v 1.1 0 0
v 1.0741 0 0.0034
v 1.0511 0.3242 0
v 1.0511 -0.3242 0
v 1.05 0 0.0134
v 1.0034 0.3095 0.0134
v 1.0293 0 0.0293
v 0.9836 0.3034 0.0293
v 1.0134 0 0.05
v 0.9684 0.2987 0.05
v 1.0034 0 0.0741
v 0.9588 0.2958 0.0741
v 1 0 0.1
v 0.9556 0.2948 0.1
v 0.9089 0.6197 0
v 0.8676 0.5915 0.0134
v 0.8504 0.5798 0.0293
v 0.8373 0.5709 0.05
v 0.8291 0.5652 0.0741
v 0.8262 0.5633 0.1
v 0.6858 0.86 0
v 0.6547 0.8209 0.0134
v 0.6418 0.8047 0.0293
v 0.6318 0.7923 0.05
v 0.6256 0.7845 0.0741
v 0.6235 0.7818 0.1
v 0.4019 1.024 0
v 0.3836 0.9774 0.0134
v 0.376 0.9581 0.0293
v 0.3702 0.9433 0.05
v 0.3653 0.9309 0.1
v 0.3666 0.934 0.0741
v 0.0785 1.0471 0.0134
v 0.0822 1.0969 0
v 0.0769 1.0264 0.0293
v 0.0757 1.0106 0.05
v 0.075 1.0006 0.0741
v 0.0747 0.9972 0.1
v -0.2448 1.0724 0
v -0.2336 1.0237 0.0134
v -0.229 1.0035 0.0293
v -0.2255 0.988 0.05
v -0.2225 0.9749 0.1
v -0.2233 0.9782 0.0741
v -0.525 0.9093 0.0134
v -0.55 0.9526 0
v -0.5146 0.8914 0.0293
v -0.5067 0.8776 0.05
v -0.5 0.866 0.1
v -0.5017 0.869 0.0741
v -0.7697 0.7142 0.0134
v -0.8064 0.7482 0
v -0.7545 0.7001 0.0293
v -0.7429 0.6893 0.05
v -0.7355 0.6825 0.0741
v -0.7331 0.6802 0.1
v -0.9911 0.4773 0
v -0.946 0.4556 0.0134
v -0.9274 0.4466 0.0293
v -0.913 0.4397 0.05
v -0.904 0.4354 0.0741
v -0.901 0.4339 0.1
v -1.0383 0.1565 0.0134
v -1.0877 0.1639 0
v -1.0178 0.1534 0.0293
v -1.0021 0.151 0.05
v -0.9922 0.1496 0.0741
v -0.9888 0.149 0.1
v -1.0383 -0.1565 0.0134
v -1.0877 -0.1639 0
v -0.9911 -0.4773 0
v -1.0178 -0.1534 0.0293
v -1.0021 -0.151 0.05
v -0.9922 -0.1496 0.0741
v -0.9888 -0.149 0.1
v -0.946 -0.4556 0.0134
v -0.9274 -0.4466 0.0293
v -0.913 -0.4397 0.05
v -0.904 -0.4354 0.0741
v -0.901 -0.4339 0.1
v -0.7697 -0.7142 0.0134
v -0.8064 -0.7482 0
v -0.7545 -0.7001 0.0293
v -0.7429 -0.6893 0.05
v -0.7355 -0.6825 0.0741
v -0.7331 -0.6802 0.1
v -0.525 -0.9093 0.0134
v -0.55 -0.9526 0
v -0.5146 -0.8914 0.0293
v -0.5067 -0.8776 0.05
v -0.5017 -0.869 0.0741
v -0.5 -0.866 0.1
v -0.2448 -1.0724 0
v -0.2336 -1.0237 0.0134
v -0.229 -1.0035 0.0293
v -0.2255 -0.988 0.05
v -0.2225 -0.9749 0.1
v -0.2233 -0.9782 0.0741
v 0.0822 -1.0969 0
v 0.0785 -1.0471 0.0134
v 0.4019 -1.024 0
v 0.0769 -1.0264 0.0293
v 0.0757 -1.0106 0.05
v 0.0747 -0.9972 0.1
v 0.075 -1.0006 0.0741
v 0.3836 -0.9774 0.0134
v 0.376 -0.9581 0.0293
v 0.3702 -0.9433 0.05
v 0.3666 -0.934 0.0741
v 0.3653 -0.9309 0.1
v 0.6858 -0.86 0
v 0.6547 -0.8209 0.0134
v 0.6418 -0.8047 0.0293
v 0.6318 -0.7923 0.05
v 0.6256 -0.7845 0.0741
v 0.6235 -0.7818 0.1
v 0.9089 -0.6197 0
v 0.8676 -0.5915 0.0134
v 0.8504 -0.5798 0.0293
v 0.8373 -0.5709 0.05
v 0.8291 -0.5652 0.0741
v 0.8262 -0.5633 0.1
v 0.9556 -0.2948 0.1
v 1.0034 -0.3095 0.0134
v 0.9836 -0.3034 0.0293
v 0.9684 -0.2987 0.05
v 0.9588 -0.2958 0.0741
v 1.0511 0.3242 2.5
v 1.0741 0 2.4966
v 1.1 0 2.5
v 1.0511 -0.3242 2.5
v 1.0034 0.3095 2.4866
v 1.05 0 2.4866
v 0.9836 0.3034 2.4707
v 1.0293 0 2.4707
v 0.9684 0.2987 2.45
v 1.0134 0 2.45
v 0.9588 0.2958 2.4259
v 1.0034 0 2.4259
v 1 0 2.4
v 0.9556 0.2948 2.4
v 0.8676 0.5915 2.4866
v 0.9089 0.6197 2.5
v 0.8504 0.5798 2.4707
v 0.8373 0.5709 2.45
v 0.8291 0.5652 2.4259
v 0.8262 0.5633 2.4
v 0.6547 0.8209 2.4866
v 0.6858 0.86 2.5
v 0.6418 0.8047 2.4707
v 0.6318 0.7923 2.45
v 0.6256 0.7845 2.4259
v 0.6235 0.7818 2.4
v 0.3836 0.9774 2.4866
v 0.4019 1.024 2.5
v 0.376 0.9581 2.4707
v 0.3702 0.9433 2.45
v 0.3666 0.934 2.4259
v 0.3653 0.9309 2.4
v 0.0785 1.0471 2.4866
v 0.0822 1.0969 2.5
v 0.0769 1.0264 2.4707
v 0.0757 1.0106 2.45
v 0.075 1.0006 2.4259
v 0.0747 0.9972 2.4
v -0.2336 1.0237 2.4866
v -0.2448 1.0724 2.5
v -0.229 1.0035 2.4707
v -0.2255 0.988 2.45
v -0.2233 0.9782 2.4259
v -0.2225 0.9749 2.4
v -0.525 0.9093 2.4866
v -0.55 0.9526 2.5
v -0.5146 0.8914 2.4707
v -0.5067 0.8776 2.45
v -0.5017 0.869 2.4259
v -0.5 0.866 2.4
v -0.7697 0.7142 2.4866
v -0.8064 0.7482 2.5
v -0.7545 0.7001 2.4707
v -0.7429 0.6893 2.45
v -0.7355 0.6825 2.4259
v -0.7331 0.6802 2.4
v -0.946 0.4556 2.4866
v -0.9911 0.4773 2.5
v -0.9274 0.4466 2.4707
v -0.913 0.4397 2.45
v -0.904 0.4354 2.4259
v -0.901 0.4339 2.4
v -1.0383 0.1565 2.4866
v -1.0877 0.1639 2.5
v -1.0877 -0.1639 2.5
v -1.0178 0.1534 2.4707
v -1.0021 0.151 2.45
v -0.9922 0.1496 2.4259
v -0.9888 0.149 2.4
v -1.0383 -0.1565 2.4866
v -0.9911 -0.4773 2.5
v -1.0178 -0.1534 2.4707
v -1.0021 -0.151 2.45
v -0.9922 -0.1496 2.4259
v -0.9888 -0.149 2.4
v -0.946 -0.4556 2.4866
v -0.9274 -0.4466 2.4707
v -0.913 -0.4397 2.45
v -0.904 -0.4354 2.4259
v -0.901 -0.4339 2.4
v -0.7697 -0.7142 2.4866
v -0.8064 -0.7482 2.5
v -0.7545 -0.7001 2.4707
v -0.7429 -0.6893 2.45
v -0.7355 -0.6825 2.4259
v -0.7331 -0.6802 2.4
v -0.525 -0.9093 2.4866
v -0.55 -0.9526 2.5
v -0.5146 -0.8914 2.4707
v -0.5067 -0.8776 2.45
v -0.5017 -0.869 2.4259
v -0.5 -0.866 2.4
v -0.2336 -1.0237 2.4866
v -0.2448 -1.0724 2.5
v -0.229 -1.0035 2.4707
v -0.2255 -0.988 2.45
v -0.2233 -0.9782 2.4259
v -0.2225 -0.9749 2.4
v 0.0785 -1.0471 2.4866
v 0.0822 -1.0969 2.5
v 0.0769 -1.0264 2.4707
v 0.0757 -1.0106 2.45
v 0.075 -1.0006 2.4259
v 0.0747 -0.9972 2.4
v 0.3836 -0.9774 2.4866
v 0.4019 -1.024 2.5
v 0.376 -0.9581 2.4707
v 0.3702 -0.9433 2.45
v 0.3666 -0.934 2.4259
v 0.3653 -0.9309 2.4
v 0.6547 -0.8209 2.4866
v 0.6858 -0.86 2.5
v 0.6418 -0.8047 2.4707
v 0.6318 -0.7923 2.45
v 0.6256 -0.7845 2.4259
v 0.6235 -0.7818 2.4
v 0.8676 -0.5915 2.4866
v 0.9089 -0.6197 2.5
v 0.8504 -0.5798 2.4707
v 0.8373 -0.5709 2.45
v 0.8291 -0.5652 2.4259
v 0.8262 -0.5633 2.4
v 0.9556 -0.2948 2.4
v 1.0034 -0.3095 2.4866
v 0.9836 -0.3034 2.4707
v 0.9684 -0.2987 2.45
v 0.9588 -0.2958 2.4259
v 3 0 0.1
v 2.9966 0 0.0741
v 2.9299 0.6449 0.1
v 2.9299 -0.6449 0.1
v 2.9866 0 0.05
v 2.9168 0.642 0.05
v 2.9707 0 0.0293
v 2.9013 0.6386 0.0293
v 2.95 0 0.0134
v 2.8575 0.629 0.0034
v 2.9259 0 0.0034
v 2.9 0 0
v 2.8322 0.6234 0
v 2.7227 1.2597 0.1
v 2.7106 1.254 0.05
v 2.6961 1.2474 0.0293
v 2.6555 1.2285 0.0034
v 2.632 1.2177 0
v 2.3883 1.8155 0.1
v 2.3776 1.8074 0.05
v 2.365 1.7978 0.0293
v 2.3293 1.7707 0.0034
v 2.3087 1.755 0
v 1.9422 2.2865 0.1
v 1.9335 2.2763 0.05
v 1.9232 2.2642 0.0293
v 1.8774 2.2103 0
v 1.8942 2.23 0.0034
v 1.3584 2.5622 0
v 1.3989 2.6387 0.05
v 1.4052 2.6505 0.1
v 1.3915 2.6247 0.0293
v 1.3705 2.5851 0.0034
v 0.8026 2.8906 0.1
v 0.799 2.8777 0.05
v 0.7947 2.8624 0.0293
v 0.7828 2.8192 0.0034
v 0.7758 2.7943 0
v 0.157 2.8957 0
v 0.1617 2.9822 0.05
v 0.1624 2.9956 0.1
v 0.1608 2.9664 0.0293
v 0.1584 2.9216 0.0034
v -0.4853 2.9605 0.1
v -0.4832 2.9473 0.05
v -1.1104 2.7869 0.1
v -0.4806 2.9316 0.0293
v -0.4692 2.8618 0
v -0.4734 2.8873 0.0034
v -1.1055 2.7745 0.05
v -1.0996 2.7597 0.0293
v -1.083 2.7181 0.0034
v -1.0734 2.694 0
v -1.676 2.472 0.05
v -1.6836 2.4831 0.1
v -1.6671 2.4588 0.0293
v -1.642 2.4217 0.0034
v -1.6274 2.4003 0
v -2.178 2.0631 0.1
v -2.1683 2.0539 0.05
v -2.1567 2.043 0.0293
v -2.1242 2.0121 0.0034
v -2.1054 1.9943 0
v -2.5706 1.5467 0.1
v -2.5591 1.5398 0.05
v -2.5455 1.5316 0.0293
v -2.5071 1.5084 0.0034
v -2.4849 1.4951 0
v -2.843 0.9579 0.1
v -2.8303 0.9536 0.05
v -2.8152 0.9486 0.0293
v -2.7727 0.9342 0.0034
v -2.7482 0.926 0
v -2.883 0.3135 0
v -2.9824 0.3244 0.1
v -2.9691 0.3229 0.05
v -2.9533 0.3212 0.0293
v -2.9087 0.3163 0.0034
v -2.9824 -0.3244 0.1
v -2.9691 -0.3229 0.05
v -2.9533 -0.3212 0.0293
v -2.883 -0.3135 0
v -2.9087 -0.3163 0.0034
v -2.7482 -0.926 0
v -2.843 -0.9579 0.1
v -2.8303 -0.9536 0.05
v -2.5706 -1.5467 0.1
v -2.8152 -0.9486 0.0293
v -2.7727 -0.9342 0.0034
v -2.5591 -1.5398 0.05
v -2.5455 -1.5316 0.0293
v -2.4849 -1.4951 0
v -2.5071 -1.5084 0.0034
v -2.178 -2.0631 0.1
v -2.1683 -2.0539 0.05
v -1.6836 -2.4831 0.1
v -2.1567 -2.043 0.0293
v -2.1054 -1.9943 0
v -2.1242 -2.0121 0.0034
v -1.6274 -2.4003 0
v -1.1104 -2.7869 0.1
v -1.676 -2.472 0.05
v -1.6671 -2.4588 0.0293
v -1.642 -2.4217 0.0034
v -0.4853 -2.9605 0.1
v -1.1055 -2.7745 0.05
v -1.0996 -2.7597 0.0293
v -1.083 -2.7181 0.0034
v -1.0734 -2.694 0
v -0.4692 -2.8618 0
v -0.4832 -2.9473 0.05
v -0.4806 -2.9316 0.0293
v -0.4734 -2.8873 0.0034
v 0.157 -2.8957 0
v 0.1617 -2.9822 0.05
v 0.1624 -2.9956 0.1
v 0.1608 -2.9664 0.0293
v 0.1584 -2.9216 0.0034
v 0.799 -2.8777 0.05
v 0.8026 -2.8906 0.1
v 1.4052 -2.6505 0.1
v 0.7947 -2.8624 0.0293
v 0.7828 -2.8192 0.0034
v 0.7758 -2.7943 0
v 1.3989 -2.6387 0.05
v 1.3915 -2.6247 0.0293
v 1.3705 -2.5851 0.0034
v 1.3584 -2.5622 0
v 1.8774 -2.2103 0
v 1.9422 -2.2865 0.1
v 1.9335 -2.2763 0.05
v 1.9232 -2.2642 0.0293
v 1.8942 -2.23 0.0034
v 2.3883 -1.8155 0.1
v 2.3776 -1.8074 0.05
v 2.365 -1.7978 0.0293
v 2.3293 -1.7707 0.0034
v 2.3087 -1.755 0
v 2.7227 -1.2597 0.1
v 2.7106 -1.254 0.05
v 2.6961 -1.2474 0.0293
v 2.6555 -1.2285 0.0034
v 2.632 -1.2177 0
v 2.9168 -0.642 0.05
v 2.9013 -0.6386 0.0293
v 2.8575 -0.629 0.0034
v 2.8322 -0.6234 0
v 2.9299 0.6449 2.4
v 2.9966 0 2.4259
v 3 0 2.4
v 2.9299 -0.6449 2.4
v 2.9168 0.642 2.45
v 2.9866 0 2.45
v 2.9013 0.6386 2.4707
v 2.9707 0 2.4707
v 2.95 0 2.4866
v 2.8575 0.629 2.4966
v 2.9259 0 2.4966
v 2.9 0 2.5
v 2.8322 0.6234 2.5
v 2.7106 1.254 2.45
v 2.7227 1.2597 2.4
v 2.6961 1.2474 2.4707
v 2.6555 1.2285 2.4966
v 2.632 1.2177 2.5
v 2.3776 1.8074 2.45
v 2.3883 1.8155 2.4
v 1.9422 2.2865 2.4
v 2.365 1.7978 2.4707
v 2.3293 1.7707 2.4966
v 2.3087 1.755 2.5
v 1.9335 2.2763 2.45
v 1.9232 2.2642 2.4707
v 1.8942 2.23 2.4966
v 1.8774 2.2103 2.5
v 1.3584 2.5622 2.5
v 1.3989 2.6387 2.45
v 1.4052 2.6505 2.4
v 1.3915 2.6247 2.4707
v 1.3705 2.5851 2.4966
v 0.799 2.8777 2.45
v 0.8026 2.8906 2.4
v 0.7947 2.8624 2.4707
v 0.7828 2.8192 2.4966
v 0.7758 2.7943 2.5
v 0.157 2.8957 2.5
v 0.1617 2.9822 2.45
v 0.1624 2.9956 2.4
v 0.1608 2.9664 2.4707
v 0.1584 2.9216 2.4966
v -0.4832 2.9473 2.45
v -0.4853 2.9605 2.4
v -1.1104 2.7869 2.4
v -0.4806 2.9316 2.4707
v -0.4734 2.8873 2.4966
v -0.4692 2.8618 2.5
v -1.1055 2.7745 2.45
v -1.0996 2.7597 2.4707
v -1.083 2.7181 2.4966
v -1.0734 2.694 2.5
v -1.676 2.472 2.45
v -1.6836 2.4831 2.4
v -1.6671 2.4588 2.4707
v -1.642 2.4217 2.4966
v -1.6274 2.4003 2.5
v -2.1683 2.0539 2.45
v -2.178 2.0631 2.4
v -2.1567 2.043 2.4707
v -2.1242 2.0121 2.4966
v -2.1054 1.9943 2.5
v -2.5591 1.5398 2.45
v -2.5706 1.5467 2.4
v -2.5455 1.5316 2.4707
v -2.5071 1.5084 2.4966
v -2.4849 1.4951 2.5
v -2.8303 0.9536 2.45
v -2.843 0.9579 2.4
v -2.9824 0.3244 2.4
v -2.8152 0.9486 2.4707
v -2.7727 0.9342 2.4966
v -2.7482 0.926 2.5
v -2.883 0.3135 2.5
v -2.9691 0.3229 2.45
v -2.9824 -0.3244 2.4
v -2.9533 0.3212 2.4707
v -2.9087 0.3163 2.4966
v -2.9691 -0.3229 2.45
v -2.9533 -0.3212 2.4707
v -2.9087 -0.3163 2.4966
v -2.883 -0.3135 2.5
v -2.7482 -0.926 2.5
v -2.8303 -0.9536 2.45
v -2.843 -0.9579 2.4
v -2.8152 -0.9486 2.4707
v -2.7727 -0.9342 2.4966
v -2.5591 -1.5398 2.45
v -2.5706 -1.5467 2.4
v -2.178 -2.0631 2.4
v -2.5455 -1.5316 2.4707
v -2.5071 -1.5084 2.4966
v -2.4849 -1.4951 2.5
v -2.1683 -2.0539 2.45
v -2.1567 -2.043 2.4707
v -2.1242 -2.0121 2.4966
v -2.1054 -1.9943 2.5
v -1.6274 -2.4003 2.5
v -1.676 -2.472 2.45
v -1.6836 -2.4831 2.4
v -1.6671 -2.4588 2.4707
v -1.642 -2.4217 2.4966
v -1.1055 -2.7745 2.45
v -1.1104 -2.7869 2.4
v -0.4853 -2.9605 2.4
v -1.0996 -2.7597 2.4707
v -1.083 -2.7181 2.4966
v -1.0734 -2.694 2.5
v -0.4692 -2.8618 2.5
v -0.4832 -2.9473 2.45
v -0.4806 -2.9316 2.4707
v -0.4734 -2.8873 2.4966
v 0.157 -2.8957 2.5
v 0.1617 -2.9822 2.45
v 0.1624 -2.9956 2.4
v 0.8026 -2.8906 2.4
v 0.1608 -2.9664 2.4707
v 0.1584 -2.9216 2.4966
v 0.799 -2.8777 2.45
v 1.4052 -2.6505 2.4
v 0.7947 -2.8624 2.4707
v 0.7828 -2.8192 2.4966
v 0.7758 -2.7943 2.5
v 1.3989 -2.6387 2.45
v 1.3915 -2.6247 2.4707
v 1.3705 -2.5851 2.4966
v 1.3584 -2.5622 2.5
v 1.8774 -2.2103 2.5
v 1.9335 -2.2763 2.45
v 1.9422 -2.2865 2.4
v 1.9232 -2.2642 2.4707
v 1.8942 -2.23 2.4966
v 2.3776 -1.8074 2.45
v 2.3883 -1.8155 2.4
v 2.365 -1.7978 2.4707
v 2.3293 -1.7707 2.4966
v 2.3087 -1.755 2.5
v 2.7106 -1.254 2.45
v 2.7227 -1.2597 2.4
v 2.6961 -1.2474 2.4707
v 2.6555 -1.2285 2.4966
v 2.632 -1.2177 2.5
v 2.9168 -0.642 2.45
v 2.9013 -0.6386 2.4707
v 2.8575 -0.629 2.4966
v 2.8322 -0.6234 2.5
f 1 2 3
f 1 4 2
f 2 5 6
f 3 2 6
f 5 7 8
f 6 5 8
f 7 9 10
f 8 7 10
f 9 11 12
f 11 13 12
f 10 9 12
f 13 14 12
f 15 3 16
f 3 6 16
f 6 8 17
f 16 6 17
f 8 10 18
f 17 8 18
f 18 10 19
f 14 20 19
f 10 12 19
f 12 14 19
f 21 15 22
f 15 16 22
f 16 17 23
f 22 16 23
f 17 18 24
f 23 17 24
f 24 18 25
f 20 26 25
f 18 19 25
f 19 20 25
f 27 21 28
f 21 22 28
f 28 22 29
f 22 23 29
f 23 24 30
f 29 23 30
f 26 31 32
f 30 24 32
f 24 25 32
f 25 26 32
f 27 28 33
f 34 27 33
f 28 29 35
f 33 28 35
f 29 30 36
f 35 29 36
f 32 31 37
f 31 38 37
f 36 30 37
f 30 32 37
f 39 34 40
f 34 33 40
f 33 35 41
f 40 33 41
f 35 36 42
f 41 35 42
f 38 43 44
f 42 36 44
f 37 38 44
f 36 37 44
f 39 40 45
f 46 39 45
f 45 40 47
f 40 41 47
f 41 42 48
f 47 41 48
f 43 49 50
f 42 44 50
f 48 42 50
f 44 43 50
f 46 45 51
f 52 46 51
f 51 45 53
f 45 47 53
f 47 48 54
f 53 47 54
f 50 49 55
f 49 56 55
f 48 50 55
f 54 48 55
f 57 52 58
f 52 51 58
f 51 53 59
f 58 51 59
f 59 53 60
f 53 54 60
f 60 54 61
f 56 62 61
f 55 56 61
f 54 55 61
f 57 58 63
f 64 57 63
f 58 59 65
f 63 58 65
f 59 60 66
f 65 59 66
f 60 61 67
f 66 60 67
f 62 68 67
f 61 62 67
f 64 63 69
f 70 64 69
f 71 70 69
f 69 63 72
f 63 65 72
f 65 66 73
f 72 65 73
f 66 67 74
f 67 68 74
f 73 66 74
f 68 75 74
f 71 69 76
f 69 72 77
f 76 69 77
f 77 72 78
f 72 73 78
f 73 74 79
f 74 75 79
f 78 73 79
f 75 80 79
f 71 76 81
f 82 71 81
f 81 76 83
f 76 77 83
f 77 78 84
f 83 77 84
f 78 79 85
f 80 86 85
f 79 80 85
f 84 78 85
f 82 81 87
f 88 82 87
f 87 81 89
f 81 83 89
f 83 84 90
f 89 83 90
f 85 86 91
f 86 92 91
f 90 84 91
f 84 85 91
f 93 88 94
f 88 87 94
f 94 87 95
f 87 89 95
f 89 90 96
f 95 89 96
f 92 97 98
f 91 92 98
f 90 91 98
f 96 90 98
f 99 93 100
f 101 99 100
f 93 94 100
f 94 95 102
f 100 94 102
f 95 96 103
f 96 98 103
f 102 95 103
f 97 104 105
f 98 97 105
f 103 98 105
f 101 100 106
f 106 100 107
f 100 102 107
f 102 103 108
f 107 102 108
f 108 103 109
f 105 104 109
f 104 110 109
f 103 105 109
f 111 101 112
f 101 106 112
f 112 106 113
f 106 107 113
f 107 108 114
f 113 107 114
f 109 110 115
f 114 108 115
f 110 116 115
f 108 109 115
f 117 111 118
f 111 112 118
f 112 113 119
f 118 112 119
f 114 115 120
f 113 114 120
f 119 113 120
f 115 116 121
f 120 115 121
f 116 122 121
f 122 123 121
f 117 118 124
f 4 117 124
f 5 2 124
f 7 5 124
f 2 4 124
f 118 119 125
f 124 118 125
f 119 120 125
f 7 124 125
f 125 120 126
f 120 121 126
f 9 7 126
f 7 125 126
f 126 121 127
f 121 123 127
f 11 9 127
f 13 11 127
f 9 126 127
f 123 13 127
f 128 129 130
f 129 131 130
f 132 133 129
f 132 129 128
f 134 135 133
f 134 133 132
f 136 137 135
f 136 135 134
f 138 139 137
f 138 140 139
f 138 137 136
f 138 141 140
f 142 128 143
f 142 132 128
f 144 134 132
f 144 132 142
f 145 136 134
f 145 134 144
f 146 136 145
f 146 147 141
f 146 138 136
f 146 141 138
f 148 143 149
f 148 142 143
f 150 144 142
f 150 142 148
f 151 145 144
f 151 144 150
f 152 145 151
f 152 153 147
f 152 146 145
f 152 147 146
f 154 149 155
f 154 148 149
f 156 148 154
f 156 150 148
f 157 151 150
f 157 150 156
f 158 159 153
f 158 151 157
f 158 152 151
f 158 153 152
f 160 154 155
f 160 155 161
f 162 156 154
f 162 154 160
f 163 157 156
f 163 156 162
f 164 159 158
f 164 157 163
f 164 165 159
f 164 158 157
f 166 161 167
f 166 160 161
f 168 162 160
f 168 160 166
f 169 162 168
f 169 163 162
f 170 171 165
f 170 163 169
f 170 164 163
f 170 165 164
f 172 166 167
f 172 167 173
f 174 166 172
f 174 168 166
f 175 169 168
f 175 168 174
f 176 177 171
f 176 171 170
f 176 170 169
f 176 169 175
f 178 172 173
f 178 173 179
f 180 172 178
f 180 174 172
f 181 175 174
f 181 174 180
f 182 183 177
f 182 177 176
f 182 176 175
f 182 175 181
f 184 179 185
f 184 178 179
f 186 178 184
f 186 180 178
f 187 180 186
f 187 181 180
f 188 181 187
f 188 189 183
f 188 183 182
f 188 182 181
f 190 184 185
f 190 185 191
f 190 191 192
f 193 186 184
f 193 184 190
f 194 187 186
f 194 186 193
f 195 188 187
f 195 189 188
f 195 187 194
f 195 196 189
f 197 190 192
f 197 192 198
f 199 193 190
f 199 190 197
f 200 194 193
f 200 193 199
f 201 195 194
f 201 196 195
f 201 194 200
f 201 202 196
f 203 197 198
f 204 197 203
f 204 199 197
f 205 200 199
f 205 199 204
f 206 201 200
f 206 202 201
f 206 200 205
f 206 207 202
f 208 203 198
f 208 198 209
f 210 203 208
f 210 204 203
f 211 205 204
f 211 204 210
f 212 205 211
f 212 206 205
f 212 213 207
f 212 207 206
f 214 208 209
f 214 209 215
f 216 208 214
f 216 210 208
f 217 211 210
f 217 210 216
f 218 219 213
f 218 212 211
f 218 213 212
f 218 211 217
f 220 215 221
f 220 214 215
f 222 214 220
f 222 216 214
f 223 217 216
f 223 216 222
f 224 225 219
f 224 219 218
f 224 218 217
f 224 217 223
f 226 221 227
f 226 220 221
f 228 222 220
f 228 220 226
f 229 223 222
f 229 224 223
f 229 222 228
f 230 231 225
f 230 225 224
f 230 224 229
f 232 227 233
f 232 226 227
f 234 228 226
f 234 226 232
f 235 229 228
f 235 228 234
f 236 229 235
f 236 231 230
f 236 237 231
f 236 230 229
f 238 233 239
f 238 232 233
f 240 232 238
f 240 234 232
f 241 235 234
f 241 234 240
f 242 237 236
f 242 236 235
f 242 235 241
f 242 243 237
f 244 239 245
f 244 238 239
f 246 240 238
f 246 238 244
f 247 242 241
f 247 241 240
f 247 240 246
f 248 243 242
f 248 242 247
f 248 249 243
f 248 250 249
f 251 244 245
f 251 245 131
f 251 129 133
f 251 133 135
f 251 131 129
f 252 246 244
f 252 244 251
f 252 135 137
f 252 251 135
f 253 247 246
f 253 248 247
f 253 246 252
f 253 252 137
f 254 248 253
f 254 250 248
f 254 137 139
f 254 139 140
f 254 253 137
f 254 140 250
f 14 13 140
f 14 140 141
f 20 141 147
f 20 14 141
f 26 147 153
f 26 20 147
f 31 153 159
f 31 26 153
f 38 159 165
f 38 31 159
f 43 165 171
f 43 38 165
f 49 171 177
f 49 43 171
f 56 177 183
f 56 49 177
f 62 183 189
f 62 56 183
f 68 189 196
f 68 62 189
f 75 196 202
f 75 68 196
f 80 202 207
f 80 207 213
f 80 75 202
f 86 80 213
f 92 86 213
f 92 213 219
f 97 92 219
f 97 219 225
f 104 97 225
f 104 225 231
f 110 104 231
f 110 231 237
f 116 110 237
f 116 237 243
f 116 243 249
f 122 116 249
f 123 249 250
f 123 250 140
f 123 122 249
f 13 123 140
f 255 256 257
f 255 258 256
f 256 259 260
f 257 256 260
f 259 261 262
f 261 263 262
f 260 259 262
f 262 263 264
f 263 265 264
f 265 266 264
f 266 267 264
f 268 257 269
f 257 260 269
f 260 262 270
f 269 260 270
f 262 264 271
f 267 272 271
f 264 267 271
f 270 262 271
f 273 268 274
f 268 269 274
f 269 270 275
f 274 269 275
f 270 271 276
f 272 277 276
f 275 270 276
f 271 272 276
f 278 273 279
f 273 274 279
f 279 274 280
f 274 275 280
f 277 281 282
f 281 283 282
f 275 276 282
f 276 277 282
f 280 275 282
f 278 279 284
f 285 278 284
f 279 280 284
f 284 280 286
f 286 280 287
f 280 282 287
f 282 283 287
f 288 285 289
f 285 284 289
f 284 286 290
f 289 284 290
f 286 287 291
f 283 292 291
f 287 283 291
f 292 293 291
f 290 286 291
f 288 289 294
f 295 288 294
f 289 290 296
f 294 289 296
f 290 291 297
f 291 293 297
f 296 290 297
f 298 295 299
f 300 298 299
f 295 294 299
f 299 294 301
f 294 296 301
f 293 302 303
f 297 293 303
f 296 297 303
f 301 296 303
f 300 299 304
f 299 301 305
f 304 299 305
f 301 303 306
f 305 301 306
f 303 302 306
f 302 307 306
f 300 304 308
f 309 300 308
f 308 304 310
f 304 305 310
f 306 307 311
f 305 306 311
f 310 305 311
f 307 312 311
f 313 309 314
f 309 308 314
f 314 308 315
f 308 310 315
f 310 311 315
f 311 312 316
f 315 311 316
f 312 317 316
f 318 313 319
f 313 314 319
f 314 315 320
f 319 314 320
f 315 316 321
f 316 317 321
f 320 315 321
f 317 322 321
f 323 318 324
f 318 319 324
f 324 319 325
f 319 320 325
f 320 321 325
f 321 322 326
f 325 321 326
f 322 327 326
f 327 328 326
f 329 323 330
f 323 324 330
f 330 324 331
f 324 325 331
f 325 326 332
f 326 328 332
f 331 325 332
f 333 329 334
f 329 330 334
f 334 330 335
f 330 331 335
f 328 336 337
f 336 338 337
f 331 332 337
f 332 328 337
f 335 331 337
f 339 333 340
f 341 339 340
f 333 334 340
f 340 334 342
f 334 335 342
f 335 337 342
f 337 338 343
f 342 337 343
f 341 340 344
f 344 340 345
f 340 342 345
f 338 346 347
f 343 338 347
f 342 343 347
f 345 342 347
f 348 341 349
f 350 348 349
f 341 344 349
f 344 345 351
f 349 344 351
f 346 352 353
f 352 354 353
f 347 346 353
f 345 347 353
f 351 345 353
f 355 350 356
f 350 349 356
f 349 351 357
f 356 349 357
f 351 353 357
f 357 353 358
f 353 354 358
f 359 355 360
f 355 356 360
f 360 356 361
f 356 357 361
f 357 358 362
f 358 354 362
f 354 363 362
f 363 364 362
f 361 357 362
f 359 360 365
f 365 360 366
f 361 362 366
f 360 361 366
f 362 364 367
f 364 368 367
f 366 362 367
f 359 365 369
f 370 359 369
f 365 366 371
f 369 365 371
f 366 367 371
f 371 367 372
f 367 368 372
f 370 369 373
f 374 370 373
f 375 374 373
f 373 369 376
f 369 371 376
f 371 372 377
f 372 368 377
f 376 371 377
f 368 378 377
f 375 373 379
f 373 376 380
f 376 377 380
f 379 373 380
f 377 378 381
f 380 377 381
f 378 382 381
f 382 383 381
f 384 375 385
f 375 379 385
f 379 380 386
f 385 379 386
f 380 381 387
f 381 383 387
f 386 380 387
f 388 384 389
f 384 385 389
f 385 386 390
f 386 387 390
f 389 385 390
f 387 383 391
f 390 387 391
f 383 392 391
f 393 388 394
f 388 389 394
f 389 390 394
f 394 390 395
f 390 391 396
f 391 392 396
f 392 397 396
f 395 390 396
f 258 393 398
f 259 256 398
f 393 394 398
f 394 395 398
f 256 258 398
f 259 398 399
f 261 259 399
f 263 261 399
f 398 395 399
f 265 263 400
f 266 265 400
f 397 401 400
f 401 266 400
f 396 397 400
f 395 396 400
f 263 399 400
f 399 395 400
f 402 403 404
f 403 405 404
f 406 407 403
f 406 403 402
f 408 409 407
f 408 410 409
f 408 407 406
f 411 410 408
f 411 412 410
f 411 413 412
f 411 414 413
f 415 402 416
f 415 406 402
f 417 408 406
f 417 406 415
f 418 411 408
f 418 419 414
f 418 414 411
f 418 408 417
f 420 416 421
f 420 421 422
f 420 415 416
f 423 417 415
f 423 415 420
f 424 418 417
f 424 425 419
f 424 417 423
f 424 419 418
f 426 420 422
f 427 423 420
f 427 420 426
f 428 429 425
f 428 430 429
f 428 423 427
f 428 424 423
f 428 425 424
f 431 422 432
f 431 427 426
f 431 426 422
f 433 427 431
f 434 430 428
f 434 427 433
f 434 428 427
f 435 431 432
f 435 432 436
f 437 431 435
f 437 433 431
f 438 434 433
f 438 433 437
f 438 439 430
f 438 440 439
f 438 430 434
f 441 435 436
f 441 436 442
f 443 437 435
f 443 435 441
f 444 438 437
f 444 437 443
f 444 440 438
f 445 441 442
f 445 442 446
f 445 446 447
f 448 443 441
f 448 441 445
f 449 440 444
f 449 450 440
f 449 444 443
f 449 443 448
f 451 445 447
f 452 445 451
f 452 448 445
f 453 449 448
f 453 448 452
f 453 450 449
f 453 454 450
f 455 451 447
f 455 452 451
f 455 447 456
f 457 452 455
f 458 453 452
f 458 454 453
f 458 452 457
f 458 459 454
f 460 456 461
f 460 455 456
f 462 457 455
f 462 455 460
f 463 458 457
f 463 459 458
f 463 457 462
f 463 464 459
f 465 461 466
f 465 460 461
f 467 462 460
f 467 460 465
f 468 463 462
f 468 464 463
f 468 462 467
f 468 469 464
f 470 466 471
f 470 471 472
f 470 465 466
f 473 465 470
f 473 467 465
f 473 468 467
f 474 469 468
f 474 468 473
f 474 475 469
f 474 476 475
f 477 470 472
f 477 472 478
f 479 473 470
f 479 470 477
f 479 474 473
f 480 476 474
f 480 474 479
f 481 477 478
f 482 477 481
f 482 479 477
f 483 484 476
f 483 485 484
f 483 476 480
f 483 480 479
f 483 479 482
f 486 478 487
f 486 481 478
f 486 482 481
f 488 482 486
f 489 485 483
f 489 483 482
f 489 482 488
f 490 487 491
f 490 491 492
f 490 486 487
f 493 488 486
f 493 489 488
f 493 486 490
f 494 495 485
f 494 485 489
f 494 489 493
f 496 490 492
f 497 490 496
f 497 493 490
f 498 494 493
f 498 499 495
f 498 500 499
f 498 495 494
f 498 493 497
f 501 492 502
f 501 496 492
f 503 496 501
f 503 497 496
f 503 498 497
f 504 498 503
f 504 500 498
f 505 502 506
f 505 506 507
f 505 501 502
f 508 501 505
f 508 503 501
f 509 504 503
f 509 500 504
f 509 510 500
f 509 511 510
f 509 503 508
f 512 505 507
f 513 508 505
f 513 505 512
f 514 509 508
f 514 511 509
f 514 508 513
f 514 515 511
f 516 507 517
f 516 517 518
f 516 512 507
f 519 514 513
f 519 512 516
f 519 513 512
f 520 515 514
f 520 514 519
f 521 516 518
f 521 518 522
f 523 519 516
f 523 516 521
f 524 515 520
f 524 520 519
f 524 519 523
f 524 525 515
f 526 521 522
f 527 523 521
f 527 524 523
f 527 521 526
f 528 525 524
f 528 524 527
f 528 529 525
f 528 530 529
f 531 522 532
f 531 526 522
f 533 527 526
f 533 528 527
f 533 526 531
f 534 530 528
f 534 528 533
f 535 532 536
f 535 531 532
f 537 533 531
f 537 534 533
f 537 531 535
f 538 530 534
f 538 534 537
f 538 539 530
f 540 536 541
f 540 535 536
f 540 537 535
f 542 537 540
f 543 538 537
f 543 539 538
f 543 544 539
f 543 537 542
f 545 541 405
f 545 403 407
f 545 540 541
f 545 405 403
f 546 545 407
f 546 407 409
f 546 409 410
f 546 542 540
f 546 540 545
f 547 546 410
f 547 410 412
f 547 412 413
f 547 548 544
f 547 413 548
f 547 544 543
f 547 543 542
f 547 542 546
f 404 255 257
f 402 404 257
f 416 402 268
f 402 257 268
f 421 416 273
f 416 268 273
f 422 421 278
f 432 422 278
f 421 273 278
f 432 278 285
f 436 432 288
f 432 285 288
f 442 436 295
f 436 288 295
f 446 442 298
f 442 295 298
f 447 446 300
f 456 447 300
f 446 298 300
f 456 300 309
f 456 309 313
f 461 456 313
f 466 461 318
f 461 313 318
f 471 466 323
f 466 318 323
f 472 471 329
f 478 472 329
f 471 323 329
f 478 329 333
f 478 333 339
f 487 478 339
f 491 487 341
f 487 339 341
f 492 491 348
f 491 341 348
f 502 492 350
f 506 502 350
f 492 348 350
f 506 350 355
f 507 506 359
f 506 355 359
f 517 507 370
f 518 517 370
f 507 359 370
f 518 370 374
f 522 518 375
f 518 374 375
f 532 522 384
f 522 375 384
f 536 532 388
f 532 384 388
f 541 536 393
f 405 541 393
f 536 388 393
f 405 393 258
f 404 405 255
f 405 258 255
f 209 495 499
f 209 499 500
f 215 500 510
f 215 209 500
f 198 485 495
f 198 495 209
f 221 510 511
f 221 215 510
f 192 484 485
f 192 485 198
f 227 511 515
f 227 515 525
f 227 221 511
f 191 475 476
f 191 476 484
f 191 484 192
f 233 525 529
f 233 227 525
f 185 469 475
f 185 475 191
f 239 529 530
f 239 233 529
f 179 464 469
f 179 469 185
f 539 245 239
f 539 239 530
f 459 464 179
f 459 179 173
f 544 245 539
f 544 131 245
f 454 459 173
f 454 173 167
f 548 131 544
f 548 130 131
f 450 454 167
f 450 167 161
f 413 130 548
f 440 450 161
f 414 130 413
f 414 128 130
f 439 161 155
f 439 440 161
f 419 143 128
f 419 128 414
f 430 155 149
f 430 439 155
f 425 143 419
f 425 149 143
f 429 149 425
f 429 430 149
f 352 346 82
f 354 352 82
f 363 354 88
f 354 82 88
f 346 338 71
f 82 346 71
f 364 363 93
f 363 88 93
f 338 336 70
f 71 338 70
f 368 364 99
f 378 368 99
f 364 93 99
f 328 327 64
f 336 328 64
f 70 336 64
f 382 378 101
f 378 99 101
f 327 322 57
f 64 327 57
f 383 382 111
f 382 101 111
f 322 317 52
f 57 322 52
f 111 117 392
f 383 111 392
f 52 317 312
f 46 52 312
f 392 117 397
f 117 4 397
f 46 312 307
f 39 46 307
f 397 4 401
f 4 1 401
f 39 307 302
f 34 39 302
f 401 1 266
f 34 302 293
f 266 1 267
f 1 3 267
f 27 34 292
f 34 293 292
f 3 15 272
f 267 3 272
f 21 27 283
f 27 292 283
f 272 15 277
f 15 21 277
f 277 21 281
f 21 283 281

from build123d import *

# Parameters (mm, degrees)
SKETCH1_R           = 3
SKETCH1_R_2         = 1
BOSS_EXTRUDE1_DEPTH = 2.5
FILLET1_R           = 0.1
FILLET2_R           = 0.1


with BuildPart() as part:
    # Sketch1 → Boss-Extrude1 (new body)
    with BuildSketch(Plane.XY):
        Circle(SKETCH1_R)
        Circle(SKETCH1_R_2, mode=Mode.SUBTRACT)
    extrude(amount=BOSS_EXTRUDE1_DEPTH)

    # Fillet1
    fillet1_edges = [part.edges().sort_by_distance(p)[0] for p in [
        (-3, 0, 2.5),
    ]]
    fillet(fillet1_edges, radius=FILLET1_R)

    # Fillet2
    fillet2_edges = [part.edges().sort_by_distance(p)[0] for p in [
        (-3, 0, 0),
        (-1, 0, 0),
        (-1, 0, 2.5),
    ]]
    fillet(fillet2_edges, radius=FILLET2_R)


solid = part.part
